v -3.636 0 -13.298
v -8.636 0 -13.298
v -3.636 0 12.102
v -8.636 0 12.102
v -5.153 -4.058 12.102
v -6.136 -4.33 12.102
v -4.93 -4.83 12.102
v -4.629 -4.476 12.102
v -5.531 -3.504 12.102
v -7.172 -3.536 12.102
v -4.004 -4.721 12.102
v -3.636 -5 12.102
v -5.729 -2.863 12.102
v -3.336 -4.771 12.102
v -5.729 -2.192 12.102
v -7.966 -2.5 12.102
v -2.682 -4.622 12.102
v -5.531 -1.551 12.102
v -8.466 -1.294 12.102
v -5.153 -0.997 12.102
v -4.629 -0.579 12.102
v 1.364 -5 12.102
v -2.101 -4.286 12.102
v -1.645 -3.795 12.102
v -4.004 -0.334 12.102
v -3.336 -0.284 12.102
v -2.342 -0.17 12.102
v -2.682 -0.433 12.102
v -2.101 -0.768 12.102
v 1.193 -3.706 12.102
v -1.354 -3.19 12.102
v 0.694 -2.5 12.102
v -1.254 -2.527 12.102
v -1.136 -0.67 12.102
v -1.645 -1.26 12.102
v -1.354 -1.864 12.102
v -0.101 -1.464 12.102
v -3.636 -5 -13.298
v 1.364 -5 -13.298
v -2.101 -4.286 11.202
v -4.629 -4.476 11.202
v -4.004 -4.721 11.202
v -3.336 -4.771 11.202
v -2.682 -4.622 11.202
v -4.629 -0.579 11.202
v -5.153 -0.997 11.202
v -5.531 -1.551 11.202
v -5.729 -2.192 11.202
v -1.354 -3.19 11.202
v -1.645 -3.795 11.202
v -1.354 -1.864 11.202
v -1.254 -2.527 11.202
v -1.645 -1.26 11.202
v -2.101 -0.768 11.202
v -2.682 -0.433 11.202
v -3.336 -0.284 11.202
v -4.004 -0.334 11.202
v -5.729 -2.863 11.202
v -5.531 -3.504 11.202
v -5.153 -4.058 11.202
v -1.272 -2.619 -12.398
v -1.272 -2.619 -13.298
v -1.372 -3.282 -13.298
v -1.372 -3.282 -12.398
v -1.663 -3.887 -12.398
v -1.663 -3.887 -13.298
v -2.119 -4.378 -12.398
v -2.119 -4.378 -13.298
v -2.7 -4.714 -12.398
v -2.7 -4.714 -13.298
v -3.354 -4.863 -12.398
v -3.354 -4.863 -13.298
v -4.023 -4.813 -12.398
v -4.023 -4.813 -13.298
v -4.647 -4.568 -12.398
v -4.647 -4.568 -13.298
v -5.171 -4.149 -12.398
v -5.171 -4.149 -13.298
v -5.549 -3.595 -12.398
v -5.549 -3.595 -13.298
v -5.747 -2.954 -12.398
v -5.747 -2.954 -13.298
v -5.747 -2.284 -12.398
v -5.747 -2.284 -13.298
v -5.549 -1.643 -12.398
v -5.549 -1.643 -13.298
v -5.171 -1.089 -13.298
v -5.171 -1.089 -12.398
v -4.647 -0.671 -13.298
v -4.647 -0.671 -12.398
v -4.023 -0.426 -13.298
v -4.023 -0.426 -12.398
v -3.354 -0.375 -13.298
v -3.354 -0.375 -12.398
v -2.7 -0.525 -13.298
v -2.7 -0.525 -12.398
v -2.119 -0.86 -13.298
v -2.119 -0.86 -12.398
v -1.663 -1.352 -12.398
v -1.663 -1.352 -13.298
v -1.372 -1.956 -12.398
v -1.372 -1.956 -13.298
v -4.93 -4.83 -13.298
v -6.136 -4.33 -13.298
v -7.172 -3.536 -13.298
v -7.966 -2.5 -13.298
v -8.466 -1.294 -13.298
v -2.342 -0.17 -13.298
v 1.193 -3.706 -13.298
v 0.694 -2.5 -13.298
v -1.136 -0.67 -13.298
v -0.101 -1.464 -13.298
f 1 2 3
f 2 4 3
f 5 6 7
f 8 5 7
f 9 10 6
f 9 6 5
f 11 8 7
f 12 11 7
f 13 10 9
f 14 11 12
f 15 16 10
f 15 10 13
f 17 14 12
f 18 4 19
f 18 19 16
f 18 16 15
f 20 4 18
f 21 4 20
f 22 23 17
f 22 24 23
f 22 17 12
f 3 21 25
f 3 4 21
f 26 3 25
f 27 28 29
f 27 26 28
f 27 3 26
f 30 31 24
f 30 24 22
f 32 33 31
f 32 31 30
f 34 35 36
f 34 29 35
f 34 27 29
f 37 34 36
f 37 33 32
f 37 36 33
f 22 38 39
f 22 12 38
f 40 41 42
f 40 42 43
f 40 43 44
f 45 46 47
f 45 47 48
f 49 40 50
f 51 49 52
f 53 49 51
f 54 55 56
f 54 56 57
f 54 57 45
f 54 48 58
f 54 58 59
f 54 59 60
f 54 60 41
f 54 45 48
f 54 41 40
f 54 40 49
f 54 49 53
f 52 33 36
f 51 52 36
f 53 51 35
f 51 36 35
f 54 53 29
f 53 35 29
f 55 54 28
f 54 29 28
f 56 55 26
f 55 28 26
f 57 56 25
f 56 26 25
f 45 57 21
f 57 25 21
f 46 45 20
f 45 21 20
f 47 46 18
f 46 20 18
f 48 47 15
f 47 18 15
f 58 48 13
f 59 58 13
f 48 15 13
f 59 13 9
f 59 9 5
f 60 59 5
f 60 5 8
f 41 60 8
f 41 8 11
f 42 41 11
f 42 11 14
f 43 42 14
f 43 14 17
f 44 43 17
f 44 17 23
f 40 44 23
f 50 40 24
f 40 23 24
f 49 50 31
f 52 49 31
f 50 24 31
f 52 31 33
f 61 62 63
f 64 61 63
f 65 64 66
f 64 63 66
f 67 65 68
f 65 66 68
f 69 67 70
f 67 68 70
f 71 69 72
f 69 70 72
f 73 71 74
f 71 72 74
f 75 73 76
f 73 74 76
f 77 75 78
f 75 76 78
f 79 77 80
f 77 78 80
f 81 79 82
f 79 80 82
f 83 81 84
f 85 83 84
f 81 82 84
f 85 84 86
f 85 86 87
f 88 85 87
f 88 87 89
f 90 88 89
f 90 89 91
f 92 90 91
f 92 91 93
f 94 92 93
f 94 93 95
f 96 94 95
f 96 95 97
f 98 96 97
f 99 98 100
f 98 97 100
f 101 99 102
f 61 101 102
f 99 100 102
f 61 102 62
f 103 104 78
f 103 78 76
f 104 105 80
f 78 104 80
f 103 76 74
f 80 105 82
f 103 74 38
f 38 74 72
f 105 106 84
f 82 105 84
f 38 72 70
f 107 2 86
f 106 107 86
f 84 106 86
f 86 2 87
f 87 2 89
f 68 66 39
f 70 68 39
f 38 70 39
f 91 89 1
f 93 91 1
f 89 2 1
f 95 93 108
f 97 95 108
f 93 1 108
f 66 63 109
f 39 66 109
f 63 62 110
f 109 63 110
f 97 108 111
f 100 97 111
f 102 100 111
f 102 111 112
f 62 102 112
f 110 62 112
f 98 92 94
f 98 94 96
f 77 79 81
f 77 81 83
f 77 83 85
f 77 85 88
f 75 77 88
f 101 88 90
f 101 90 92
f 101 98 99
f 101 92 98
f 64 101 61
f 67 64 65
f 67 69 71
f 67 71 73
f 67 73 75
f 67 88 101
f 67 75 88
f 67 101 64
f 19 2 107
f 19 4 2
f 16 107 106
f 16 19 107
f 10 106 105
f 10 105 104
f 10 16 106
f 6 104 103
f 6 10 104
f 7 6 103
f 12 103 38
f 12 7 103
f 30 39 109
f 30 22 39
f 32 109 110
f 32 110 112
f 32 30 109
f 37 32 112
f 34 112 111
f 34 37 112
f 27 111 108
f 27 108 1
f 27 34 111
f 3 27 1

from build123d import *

# Parameters (mm, degrees)
F0_W     = 10
F0_H     = 25.4
F1_DEPTH = 5
F2_R     = 4.99999
F3_R     = 2.25
F4_DEPTH = 0.9
F5_R     = 2.25
F6_DEPTH = 0.9


# Not quite as in the source:
# - a fillet or chamfer is up to 0.001 mm smaller than in the source, because OpenCascade refuses the exact size


with BuildPart() as f1:
    # F0 (on Front) → F1 (new body)
    with BuildSketch(Plane.XZ):
        with Locations((-3.6362301892, -0.5979733542)):
            Rectangle(F0_W, F0_H)
    extrude(amount=F1_DEPTH)

    # F2 (radius 5 in the source; OpenCascade refuses exactly that, so slightly less here)
    f2_edges = [f1.edges().sort_by_distance(p)[0] for p in [
        (1.36377, 0, -0.597973),
        (-8.63623, -5, -0.597973),
    ]]
    fillet(f2_edges, radius=F2_R)

    # F3 (on face) → F4 (cut)
    with BuildSketch(Plane.XY.offset(12.1020266458)):
        with Locations((-3.5037611703, -2.5272680031)):
            Circle(F3_R)
    extrude(amount=-F4_DEPTH, mode=Mode.SUBTRACT)

    # F5 (on face) → F6 (cut)
    with BuildSketch(Plane(origin=(0, 0, -13.2979733542), x_dir=(1, 0, 0), z_dir=(0, 0, -1))):
        with Locations((-3.5220479187, 2.6191056776)):
            Circle(F5_R)
    extrude(amount=-F6_DEPTH, mode=Mode.SUBTRACT)


solid = f1.part
